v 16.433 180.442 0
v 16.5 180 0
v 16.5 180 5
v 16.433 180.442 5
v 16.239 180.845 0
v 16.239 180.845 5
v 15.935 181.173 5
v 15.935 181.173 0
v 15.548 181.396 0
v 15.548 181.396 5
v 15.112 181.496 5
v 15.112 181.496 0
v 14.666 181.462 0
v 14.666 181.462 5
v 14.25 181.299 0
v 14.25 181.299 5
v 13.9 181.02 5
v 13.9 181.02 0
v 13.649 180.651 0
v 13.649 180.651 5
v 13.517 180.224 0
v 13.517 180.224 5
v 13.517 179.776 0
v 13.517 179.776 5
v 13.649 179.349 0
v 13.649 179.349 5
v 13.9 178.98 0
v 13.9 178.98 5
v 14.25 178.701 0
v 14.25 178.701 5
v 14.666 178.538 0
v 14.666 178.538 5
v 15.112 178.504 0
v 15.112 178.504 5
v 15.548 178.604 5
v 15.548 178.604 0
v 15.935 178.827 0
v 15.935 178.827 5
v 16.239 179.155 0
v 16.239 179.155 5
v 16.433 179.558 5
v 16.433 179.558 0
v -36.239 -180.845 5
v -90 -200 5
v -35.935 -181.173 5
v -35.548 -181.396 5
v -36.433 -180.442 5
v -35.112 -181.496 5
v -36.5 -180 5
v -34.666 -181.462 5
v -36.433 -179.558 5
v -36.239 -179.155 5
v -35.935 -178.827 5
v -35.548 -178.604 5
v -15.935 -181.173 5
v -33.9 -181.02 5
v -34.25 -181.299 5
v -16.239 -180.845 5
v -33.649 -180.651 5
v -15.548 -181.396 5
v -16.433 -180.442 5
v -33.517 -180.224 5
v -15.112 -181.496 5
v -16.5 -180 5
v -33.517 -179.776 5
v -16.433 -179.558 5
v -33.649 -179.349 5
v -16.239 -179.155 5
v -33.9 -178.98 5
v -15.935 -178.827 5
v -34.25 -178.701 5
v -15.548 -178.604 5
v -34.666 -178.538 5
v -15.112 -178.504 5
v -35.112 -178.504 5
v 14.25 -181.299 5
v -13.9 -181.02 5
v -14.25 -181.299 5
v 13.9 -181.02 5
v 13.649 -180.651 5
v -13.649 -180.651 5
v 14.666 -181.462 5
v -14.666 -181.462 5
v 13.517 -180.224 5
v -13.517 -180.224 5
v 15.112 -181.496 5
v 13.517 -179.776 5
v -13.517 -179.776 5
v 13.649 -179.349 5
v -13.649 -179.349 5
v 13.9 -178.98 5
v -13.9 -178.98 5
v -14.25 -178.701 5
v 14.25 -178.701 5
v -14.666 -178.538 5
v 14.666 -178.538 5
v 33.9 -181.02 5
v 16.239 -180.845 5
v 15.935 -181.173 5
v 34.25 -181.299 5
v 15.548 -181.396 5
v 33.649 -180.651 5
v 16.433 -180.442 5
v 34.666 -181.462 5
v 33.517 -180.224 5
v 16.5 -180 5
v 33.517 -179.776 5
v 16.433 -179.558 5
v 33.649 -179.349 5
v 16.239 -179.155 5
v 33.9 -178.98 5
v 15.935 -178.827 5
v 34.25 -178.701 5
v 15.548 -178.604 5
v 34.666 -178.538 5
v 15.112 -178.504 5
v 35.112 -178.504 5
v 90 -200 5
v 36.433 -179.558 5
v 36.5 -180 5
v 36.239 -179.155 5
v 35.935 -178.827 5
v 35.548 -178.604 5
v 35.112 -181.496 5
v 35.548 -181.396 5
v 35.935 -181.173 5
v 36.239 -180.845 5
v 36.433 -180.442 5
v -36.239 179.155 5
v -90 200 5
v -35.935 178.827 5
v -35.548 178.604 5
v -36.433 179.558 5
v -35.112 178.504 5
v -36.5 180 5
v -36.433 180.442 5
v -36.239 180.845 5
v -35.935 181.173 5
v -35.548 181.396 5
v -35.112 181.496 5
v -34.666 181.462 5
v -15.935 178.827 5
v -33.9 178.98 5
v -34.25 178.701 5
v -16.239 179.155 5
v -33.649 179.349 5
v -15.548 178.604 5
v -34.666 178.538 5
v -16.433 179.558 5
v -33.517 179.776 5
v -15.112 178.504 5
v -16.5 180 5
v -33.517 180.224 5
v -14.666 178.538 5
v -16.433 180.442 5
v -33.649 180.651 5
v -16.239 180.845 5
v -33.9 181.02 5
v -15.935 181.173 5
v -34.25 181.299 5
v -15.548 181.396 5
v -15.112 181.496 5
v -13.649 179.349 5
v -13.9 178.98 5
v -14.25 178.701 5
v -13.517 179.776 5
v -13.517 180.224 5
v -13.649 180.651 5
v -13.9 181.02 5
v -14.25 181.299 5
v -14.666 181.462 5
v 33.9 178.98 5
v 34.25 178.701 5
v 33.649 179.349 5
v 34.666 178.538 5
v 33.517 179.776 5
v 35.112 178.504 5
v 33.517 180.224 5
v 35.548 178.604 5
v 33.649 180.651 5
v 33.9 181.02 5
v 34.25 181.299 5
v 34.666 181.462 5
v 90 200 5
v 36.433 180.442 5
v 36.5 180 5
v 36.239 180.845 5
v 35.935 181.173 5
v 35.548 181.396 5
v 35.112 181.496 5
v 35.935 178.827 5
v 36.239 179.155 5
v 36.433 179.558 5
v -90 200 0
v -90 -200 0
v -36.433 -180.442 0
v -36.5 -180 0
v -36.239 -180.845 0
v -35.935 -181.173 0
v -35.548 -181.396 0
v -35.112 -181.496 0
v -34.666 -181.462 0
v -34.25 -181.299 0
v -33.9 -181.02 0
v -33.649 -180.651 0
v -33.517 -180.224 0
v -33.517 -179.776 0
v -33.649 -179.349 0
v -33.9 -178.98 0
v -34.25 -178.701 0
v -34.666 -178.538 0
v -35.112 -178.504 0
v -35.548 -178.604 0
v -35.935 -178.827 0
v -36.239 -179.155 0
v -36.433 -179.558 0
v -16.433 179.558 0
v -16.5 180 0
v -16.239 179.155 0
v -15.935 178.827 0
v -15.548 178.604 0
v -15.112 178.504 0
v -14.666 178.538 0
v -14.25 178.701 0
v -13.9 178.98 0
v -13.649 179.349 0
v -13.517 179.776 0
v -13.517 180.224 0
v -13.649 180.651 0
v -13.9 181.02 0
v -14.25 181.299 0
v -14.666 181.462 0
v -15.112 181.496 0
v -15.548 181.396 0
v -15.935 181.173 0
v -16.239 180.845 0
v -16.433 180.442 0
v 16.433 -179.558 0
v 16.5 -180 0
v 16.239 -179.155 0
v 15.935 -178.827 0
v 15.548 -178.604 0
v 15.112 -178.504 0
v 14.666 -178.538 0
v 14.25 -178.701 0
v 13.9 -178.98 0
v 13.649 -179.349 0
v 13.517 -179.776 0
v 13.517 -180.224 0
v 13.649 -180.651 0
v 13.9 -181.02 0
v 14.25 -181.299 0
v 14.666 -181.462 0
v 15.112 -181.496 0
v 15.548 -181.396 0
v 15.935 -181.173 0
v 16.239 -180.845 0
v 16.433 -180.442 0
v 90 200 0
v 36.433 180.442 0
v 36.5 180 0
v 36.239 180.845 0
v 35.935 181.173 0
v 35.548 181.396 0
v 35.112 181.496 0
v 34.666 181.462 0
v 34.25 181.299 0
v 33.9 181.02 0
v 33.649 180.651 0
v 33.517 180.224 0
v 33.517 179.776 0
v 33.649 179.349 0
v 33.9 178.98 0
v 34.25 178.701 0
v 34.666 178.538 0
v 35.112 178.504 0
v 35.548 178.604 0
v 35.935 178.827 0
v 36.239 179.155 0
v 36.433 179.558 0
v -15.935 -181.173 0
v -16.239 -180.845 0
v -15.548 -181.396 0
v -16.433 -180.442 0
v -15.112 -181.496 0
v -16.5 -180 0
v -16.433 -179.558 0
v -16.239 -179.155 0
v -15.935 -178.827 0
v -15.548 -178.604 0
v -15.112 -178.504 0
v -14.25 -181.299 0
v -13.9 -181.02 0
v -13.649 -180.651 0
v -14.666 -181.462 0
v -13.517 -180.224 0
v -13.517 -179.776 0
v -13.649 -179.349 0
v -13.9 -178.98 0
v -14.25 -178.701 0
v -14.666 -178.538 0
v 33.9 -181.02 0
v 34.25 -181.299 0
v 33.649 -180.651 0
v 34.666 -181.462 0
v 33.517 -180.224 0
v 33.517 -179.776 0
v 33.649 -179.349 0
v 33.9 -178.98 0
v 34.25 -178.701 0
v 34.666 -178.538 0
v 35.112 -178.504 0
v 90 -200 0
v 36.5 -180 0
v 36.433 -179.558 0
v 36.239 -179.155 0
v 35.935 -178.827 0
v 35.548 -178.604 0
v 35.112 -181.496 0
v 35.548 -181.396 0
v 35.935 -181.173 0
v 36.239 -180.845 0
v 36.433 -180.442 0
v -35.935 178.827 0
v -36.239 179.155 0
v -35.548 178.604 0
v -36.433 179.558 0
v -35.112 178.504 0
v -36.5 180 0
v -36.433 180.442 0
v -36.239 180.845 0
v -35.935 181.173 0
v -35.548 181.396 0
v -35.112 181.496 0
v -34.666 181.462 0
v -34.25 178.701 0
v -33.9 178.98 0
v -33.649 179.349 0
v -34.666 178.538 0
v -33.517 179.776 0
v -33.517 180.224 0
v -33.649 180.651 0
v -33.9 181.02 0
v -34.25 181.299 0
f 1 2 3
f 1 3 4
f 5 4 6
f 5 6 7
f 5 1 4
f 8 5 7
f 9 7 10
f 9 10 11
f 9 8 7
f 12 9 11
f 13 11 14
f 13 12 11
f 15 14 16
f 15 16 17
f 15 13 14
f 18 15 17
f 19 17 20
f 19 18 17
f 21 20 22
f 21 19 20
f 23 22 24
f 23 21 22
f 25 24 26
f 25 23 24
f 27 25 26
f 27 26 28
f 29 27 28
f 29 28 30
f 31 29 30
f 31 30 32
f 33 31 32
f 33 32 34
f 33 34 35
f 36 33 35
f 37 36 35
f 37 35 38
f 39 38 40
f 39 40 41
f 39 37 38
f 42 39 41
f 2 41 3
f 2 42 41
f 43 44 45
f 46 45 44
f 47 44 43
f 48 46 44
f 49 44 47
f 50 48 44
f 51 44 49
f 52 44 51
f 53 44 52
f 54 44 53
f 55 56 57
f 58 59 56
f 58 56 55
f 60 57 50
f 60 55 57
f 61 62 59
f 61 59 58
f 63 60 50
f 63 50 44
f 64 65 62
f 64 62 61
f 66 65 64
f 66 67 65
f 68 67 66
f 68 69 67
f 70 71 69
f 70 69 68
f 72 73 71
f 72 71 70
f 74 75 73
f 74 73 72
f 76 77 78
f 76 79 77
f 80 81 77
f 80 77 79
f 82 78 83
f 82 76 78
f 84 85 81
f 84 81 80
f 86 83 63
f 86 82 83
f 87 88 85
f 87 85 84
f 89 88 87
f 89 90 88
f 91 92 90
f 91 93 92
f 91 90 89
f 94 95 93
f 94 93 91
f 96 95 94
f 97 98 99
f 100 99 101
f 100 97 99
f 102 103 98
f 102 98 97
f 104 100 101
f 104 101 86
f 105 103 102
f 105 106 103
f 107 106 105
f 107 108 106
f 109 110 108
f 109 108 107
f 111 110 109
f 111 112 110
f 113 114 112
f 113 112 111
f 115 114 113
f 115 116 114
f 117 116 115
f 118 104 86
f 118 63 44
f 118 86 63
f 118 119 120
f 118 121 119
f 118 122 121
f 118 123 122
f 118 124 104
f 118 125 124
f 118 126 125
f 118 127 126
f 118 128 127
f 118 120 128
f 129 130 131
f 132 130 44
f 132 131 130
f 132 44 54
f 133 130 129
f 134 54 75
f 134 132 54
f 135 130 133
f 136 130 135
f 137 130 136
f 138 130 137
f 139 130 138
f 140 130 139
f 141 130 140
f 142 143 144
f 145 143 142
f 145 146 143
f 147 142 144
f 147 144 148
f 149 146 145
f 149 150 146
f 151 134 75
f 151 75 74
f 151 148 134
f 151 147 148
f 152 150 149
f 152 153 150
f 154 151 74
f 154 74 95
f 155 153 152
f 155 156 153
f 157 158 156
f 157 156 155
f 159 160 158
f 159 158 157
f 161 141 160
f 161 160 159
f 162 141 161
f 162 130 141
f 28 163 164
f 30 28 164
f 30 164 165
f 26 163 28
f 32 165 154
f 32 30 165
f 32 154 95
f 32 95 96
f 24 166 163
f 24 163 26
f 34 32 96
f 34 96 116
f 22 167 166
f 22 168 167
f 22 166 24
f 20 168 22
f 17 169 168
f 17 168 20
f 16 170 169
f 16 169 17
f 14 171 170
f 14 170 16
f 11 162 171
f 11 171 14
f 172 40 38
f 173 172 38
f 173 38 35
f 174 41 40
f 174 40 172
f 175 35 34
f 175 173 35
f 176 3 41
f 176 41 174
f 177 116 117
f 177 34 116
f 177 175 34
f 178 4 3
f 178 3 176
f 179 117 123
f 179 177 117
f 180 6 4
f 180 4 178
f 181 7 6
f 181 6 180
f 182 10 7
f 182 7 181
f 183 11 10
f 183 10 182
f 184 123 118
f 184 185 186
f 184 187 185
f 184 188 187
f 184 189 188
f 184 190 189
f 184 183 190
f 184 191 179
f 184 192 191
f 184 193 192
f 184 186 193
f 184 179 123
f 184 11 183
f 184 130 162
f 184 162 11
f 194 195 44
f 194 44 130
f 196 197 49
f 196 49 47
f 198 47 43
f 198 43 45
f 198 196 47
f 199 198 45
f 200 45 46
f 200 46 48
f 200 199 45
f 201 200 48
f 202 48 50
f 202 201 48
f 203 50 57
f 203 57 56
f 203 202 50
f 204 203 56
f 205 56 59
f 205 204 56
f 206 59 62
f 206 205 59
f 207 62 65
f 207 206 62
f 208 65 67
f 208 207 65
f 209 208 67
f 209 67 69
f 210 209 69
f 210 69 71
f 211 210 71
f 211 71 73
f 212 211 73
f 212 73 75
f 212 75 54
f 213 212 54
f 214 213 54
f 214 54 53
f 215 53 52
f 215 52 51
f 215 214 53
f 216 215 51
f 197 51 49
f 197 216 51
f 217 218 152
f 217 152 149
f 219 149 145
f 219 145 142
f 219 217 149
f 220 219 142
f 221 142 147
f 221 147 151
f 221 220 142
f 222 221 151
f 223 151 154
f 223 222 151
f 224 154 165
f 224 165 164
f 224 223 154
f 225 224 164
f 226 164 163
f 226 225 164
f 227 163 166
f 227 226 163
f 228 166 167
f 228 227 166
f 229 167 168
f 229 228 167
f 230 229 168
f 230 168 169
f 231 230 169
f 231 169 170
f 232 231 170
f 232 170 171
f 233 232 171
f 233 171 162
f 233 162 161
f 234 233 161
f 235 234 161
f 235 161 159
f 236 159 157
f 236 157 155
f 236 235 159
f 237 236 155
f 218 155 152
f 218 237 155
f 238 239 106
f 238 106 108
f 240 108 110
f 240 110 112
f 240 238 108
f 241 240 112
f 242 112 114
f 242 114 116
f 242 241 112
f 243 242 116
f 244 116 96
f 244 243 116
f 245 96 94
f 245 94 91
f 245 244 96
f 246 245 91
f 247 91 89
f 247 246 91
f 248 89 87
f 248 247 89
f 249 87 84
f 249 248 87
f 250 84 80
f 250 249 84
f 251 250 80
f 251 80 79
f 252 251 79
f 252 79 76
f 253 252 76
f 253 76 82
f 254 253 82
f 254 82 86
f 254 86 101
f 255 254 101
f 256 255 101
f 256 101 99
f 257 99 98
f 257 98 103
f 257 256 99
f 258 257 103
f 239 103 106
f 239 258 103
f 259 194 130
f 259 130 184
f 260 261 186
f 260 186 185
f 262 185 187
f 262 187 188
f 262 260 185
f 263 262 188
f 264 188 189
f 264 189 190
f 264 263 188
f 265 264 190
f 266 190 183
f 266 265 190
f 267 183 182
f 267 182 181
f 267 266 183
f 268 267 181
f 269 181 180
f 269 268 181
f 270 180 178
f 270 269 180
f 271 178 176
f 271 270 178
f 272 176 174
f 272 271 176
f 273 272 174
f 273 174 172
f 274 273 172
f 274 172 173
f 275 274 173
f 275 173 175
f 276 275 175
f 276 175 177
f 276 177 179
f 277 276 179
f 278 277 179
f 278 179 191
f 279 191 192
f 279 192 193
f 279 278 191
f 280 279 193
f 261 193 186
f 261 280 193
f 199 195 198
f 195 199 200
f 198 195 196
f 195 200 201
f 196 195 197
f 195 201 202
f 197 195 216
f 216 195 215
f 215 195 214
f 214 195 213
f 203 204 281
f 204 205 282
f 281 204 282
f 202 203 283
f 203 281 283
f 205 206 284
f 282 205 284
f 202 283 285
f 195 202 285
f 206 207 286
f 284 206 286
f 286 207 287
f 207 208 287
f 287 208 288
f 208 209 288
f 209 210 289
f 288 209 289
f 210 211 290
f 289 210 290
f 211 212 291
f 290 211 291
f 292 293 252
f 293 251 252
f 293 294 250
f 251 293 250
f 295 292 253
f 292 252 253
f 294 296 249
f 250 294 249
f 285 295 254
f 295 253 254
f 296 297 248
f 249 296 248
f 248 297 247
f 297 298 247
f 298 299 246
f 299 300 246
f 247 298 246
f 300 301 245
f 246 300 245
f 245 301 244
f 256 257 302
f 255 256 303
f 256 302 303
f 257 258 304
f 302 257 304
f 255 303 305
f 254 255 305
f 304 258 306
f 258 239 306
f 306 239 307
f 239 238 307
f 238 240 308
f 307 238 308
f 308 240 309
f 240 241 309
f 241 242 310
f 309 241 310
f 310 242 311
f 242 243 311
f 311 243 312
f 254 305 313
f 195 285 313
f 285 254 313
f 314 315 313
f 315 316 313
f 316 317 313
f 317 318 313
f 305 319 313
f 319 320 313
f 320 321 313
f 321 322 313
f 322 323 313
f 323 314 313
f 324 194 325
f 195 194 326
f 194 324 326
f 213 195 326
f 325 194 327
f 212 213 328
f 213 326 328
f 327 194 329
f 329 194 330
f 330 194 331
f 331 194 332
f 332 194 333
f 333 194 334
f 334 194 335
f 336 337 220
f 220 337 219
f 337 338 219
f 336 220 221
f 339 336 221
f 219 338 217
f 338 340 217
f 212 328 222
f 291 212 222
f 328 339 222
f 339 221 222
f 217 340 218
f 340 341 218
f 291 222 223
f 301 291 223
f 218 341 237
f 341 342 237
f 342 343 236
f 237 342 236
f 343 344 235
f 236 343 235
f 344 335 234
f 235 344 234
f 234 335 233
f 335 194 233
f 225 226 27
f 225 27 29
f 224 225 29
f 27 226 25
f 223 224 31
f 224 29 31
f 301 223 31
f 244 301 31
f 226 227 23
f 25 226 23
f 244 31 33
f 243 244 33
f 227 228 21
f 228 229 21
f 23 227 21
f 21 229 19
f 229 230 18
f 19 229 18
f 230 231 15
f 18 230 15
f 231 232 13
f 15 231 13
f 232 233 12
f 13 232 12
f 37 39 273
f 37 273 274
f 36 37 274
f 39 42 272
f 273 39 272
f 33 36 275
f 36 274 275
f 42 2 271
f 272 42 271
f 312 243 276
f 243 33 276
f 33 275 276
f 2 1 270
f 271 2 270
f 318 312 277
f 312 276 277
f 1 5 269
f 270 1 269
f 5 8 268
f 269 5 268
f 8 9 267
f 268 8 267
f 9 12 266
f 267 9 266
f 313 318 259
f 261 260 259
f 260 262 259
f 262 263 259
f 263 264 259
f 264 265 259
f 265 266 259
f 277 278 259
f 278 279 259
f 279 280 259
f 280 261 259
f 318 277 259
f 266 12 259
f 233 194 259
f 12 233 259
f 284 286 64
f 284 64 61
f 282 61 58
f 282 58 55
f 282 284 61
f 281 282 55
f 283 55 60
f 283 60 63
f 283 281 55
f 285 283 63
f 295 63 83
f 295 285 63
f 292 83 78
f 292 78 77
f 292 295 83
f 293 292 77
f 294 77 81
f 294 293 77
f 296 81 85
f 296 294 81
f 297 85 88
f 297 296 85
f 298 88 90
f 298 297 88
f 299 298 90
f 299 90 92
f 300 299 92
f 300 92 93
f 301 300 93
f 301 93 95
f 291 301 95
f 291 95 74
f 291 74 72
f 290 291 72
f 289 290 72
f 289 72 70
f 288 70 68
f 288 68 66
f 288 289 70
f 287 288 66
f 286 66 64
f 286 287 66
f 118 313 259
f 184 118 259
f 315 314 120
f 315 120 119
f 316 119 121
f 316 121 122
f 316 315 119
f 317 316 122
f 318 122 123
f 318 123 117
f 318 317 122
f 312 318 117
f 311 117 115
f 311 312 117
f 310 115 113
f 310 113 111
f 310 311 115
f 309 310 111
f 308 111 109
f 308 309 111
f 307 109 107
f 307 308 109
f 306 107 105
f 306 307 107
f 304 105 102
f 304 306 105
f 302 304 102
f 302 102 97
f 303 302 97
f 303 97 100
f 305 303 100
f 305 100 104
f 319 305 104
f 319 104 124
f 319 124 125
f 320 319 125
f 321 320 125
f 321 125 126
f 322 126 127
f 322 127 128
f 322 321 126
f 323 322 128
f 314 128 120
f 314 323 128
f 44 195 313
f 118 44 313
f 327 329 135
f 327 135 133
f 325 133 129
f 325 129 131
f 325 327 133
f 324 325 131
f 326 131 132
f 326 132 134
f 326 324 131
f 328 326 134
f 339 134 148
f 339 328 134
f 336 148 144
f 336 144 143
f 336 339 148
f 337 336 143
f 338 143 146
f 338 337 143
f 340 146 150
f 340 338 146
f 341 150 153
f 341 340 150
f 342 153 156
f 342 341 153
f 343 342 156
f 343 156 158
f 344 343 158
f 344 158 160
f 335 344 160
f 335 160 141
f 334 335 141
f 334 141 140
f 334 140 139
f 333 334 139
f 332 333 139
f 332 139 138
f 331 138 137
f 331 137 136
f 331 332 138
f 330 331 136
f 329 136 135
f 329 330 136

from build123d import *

# Parameters (mm, degrees)
CROQUIS1_W              = 180
CROQUIS1_H              = 400
CROQUIS1_R              = 1.5
SALIENTE_EXTRUIR1_DEPTH = 5


with BuildPart() as part:
    # Croquis1 → Saliente-Extruir1 (new body)
    with BuildSketch(Plane.XY):
        Rectangle(CROQUIS1_W, CROQUIS1_H)
        with Locations((15, -180)):
            Circle(CROQUIS1_R, mode=Mode.SUBTRACT)
        with Locations((35, -180)):
            Circle(CROQUIS1_R, mode=Mode.SUBTRACT)
        with Locations(Location((-35, -180, 0), (0, 0, 180))):
            Circle(CROQUIS1_R, mode=Mode.SUBTRACT)
        with Locations(Location((-15, -180, 0), (0, 0, 180))):
            Circle(CROQUIS1_R, mode=Mode.SUBTRACT)
        with Locations((15, 180)):
            Circle(CROQUIS1_R, mode=Mode.SUBTRACT)
        with Locations((35, 180)):
            Circle(CROQUIS1_R, mode=Mode.SUBTRACT)
        with Locations(Location((-35, 180, 0), (0, 0, 180))):
            Circle(CROQUIS1_R, mode=Mode.SUBTRACT)
        with Locations(Location((-15, 180, 0), (0, 0, 180))):
            Circle(CROQUIS1_R, mode=Mode.SUBTRACT)
    extrude(amount=SALIENTE_EXTRUIR1_DEPTH)


solid = part.part
